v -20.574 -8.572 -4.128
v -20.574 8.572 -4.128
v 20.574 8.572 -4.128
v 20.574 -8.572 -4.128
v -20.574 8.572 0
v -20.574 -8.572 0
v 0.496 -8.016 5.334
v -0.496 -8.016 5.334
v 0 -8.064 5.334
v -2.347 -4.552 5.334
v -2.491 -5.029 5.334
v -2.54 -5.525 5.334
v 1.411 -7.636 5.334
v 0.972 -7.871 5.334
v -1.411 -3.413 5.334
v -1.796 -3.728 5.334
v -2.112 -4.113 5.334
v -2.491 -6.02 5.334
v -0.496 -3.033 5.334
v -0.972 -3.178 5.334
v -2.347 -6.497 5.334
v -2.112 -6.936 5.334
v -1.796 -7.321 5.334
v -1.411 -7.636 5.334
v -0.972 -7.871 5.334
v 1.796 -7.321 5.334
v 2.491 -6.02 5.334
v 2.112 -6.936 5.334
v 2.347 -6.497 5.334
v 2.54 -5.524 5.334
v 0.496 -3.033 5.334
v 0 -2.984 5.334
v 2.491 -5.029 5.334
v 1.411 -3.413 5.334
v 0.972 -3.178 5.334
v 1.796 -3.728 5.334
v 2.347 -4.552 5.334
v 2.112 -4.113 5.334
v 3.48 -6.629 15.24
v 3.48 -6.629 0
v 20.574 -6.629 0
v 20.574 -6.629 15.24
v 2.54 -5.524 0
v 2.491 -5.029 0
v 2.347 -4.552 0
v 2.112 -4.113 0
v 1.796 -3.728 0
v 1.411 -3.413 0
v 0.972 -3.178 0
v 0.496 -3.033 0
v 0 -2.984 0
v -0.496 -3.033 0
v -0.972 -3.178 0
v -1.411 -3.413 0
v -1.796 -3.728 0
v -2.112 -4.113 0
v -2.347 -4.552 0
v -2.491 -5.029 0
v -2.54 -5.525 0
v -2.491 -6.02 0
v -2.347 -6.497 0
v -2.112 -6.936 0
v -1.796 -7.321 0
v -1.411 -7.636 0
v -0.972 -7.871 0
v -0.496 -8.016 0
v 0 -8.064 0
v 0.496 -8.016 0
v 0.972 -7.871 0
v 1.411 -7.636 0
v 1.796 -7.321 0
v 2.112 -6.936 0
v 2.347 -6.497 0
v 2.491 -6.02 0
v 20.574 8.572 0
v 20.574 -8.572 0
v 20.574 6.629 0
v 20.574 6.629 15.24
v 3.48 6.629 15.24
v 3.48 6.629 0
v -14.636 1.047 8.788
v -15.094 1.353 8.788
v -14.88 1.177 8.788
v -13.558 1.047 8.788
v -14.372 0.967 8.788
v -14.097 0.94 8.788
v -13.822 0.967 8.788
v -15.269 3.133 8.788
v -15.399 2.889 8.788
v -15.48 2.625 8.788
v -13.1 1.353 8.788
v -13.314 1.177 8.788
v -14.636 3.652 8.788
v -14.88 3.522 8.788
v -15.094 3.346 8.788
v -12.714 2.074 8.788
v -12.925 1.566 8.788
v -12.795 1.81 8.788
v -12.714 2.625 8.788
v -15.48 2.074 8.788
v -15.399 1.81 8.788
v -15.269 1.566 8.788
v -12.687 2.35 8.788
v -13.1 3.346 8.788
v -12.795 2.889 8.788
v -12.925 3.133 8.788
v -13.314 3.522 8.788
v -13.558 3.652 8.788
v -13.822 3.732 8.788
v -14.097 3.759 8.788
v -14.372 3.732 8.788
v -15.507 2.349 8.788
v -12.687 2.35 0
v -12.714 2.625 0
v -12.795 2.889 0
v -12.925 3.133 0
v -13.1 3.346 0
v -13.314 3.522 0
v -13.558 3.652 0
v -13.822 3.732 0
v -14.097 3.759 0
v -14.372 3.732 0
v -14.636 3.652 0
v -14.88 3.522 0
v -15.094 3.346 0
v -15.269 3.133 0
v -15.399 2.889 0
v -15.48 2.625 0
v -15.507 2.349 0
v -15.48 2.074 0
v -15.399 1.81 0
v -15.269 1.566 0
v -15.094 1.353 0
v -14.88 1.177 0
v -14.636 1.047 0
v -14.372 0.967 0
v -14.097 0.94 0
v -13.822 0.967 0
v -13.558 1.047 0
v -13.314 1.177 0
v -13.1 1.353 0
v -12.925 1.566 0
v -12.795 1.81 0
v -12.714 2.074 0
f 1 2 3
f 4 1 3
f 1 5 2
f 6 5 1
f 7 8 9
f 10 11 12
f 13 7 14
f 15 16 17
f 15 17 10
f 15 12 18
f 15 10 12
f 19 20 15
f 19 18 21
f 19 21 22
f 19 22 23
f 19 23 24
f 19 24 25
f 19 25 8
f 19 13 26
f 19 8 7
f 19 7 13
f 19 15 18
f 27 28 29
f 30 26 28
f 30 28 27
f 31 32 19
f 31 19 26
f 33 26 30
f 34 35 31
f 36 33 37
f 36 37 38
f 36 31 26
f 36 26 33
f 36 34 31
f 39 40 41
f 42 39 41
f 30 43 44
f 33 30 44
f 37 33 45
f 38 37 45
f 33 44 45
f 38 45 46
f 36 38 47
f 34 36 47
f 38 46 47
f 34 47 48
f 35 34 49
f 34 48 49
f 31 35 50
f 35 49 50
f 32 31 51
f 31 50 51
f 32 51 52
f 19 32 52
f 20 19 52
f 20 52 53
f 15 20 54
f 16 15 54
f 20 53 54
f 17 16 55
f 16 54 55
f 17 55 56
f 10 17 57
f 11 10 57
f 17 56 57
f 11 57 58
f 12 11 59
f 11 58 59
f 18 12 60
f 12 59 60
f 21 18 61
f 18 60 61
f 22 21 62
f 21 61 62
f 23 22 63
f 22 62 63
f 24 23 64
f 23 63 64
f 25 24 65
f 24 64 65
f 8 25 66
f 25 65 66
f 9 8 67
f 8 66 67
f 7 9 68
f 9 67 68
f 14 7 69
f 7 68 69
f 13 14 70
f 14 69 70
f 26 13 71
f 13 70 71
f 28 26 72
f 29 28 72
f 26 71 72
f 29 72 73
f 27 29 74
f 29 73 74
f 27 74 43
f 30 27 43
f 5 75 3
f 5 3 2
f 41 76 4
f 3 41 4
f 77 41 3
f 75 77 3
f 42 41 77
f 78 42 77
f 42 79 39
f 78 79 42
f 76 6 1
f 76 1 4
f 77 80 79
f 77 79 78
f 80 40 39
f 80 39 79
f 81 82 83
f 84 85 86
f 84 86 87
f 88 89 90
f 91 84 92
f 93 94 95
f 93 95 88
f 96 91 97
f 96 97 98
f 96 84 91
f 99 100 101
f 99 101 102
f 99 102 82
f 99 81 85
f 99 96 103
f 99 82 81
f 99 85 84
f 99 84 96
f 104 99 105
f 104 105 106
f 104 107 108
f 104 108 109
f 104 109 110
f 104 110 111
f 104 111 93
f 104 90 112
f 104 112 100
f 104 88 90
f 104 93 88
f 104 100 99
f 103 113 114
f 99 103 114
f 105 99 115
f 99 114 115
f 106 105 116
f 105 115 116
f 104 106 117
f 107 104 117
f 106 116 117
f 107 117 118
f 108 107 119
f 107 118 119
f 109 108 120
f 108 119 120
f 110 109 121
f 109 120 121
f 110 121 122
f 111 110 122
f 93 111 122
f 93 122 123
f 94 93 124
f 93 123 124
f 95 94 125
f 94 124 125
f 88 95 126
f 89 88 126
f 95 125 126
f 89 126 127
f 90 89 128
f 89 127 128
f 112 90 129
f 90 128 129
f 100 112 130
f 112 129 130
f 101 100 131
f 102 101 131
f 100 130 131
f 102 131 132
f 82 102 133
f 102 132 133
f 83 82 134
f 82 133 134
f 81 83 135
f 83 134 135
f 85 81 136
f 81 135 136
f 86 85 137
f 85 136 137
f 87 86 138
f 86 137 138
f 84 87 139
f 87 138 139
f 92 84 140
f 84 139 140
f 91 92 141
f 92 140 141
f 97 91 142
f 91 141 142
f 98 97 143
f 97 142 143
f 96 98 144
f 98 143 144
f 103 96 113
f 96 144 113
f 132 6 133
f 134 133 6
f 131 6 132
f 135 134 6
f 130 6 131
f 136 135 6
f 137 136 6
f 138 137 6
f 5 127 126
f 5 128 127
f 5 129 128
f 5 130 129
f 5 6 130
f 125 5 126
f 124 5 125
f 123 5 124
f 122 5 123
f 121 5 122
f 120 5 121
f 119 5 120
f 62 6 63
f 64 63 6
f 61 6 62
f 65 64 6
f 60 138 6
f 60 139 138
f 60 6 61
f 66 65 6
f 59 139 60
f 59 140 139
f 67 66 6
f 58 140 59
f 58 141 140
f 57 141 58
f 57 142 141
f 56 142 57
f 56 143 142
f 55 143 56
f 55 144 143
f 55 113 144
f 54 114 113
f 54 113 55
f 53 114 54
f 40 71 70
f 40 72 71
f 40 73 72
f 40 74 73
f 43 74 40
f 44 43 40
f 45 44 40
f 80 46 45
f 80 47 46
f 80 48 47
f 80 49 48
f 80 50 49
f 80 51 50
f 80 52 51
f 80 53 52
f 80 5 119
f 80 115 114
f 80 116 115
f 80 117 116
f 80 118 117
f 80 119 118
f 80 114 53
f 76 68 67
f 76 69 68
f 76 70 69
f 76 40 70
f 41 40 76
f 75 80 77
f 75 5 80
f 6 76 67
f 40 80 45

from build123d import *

# Parameters (mm, degrees)
F0_R     = 2.54
F0_R_2   = 1.4097
F0_W     = 17.0942
F0_H     = 13.2588
F1_DEPTH = 4.1275
F2_DEPTH = 15.24
F3_DEPTH = 8.7884
F4_DEPTH = 5.334


with BuildPart() as f1:
    # F0 (on Top) → F1 (new body)
    with BuildSketch(Plane.XY):
        Polygon((20.574, 8.5725), (-20.574, 8.5725), (-20.574, -8.5725), (20.574, -8.5725), (20.574, -6.6294), (3.4798, -6.6294), (3.4798, 6.6294), (20.574, 6.6294), align=None)
        with Locations((0, -5.5245)):
            Circle(F0_R, mode=Mode.SUBTRACT)
        with Locations((-14.097, 2.3495)):
            Circle(F0_R_2, mode=Mode.SUBTRACT)
        with Locations((12.0269, 0)):
            Rectangle(F0_W, F0_H)
        with Locations((0, -5.5245)):
            Circle(F0_R)
        with Locations((-14.097, 2.3495)):
            Circle(F0_R_2)
    extrude(amount=-F1_DEPTH)

    # F0 (on Top) → F2 (join)
    with BuildSketch(Plane.XY):
        with Locations((12.0269, 0)):
            Rectangle(F0_W, F0_H)
    extrude(amount=F2_DEPTH)

    # F0 (on Top) → F3 (join)
    with BuildSketch(Plane.XY):
        with Locations((-14.097, 2.3495)):
            Circle(F0_R_2)
    extrude(amount=F3_DEPTH)

    # F0 (on Top) → F4 (join)
    with BuildSketch(Plane.XY):
        with Locations((0, -5.5245)):
            Circle(F0_R)
    extrude(amount=F4_DEPTH)


solid = f1.part
